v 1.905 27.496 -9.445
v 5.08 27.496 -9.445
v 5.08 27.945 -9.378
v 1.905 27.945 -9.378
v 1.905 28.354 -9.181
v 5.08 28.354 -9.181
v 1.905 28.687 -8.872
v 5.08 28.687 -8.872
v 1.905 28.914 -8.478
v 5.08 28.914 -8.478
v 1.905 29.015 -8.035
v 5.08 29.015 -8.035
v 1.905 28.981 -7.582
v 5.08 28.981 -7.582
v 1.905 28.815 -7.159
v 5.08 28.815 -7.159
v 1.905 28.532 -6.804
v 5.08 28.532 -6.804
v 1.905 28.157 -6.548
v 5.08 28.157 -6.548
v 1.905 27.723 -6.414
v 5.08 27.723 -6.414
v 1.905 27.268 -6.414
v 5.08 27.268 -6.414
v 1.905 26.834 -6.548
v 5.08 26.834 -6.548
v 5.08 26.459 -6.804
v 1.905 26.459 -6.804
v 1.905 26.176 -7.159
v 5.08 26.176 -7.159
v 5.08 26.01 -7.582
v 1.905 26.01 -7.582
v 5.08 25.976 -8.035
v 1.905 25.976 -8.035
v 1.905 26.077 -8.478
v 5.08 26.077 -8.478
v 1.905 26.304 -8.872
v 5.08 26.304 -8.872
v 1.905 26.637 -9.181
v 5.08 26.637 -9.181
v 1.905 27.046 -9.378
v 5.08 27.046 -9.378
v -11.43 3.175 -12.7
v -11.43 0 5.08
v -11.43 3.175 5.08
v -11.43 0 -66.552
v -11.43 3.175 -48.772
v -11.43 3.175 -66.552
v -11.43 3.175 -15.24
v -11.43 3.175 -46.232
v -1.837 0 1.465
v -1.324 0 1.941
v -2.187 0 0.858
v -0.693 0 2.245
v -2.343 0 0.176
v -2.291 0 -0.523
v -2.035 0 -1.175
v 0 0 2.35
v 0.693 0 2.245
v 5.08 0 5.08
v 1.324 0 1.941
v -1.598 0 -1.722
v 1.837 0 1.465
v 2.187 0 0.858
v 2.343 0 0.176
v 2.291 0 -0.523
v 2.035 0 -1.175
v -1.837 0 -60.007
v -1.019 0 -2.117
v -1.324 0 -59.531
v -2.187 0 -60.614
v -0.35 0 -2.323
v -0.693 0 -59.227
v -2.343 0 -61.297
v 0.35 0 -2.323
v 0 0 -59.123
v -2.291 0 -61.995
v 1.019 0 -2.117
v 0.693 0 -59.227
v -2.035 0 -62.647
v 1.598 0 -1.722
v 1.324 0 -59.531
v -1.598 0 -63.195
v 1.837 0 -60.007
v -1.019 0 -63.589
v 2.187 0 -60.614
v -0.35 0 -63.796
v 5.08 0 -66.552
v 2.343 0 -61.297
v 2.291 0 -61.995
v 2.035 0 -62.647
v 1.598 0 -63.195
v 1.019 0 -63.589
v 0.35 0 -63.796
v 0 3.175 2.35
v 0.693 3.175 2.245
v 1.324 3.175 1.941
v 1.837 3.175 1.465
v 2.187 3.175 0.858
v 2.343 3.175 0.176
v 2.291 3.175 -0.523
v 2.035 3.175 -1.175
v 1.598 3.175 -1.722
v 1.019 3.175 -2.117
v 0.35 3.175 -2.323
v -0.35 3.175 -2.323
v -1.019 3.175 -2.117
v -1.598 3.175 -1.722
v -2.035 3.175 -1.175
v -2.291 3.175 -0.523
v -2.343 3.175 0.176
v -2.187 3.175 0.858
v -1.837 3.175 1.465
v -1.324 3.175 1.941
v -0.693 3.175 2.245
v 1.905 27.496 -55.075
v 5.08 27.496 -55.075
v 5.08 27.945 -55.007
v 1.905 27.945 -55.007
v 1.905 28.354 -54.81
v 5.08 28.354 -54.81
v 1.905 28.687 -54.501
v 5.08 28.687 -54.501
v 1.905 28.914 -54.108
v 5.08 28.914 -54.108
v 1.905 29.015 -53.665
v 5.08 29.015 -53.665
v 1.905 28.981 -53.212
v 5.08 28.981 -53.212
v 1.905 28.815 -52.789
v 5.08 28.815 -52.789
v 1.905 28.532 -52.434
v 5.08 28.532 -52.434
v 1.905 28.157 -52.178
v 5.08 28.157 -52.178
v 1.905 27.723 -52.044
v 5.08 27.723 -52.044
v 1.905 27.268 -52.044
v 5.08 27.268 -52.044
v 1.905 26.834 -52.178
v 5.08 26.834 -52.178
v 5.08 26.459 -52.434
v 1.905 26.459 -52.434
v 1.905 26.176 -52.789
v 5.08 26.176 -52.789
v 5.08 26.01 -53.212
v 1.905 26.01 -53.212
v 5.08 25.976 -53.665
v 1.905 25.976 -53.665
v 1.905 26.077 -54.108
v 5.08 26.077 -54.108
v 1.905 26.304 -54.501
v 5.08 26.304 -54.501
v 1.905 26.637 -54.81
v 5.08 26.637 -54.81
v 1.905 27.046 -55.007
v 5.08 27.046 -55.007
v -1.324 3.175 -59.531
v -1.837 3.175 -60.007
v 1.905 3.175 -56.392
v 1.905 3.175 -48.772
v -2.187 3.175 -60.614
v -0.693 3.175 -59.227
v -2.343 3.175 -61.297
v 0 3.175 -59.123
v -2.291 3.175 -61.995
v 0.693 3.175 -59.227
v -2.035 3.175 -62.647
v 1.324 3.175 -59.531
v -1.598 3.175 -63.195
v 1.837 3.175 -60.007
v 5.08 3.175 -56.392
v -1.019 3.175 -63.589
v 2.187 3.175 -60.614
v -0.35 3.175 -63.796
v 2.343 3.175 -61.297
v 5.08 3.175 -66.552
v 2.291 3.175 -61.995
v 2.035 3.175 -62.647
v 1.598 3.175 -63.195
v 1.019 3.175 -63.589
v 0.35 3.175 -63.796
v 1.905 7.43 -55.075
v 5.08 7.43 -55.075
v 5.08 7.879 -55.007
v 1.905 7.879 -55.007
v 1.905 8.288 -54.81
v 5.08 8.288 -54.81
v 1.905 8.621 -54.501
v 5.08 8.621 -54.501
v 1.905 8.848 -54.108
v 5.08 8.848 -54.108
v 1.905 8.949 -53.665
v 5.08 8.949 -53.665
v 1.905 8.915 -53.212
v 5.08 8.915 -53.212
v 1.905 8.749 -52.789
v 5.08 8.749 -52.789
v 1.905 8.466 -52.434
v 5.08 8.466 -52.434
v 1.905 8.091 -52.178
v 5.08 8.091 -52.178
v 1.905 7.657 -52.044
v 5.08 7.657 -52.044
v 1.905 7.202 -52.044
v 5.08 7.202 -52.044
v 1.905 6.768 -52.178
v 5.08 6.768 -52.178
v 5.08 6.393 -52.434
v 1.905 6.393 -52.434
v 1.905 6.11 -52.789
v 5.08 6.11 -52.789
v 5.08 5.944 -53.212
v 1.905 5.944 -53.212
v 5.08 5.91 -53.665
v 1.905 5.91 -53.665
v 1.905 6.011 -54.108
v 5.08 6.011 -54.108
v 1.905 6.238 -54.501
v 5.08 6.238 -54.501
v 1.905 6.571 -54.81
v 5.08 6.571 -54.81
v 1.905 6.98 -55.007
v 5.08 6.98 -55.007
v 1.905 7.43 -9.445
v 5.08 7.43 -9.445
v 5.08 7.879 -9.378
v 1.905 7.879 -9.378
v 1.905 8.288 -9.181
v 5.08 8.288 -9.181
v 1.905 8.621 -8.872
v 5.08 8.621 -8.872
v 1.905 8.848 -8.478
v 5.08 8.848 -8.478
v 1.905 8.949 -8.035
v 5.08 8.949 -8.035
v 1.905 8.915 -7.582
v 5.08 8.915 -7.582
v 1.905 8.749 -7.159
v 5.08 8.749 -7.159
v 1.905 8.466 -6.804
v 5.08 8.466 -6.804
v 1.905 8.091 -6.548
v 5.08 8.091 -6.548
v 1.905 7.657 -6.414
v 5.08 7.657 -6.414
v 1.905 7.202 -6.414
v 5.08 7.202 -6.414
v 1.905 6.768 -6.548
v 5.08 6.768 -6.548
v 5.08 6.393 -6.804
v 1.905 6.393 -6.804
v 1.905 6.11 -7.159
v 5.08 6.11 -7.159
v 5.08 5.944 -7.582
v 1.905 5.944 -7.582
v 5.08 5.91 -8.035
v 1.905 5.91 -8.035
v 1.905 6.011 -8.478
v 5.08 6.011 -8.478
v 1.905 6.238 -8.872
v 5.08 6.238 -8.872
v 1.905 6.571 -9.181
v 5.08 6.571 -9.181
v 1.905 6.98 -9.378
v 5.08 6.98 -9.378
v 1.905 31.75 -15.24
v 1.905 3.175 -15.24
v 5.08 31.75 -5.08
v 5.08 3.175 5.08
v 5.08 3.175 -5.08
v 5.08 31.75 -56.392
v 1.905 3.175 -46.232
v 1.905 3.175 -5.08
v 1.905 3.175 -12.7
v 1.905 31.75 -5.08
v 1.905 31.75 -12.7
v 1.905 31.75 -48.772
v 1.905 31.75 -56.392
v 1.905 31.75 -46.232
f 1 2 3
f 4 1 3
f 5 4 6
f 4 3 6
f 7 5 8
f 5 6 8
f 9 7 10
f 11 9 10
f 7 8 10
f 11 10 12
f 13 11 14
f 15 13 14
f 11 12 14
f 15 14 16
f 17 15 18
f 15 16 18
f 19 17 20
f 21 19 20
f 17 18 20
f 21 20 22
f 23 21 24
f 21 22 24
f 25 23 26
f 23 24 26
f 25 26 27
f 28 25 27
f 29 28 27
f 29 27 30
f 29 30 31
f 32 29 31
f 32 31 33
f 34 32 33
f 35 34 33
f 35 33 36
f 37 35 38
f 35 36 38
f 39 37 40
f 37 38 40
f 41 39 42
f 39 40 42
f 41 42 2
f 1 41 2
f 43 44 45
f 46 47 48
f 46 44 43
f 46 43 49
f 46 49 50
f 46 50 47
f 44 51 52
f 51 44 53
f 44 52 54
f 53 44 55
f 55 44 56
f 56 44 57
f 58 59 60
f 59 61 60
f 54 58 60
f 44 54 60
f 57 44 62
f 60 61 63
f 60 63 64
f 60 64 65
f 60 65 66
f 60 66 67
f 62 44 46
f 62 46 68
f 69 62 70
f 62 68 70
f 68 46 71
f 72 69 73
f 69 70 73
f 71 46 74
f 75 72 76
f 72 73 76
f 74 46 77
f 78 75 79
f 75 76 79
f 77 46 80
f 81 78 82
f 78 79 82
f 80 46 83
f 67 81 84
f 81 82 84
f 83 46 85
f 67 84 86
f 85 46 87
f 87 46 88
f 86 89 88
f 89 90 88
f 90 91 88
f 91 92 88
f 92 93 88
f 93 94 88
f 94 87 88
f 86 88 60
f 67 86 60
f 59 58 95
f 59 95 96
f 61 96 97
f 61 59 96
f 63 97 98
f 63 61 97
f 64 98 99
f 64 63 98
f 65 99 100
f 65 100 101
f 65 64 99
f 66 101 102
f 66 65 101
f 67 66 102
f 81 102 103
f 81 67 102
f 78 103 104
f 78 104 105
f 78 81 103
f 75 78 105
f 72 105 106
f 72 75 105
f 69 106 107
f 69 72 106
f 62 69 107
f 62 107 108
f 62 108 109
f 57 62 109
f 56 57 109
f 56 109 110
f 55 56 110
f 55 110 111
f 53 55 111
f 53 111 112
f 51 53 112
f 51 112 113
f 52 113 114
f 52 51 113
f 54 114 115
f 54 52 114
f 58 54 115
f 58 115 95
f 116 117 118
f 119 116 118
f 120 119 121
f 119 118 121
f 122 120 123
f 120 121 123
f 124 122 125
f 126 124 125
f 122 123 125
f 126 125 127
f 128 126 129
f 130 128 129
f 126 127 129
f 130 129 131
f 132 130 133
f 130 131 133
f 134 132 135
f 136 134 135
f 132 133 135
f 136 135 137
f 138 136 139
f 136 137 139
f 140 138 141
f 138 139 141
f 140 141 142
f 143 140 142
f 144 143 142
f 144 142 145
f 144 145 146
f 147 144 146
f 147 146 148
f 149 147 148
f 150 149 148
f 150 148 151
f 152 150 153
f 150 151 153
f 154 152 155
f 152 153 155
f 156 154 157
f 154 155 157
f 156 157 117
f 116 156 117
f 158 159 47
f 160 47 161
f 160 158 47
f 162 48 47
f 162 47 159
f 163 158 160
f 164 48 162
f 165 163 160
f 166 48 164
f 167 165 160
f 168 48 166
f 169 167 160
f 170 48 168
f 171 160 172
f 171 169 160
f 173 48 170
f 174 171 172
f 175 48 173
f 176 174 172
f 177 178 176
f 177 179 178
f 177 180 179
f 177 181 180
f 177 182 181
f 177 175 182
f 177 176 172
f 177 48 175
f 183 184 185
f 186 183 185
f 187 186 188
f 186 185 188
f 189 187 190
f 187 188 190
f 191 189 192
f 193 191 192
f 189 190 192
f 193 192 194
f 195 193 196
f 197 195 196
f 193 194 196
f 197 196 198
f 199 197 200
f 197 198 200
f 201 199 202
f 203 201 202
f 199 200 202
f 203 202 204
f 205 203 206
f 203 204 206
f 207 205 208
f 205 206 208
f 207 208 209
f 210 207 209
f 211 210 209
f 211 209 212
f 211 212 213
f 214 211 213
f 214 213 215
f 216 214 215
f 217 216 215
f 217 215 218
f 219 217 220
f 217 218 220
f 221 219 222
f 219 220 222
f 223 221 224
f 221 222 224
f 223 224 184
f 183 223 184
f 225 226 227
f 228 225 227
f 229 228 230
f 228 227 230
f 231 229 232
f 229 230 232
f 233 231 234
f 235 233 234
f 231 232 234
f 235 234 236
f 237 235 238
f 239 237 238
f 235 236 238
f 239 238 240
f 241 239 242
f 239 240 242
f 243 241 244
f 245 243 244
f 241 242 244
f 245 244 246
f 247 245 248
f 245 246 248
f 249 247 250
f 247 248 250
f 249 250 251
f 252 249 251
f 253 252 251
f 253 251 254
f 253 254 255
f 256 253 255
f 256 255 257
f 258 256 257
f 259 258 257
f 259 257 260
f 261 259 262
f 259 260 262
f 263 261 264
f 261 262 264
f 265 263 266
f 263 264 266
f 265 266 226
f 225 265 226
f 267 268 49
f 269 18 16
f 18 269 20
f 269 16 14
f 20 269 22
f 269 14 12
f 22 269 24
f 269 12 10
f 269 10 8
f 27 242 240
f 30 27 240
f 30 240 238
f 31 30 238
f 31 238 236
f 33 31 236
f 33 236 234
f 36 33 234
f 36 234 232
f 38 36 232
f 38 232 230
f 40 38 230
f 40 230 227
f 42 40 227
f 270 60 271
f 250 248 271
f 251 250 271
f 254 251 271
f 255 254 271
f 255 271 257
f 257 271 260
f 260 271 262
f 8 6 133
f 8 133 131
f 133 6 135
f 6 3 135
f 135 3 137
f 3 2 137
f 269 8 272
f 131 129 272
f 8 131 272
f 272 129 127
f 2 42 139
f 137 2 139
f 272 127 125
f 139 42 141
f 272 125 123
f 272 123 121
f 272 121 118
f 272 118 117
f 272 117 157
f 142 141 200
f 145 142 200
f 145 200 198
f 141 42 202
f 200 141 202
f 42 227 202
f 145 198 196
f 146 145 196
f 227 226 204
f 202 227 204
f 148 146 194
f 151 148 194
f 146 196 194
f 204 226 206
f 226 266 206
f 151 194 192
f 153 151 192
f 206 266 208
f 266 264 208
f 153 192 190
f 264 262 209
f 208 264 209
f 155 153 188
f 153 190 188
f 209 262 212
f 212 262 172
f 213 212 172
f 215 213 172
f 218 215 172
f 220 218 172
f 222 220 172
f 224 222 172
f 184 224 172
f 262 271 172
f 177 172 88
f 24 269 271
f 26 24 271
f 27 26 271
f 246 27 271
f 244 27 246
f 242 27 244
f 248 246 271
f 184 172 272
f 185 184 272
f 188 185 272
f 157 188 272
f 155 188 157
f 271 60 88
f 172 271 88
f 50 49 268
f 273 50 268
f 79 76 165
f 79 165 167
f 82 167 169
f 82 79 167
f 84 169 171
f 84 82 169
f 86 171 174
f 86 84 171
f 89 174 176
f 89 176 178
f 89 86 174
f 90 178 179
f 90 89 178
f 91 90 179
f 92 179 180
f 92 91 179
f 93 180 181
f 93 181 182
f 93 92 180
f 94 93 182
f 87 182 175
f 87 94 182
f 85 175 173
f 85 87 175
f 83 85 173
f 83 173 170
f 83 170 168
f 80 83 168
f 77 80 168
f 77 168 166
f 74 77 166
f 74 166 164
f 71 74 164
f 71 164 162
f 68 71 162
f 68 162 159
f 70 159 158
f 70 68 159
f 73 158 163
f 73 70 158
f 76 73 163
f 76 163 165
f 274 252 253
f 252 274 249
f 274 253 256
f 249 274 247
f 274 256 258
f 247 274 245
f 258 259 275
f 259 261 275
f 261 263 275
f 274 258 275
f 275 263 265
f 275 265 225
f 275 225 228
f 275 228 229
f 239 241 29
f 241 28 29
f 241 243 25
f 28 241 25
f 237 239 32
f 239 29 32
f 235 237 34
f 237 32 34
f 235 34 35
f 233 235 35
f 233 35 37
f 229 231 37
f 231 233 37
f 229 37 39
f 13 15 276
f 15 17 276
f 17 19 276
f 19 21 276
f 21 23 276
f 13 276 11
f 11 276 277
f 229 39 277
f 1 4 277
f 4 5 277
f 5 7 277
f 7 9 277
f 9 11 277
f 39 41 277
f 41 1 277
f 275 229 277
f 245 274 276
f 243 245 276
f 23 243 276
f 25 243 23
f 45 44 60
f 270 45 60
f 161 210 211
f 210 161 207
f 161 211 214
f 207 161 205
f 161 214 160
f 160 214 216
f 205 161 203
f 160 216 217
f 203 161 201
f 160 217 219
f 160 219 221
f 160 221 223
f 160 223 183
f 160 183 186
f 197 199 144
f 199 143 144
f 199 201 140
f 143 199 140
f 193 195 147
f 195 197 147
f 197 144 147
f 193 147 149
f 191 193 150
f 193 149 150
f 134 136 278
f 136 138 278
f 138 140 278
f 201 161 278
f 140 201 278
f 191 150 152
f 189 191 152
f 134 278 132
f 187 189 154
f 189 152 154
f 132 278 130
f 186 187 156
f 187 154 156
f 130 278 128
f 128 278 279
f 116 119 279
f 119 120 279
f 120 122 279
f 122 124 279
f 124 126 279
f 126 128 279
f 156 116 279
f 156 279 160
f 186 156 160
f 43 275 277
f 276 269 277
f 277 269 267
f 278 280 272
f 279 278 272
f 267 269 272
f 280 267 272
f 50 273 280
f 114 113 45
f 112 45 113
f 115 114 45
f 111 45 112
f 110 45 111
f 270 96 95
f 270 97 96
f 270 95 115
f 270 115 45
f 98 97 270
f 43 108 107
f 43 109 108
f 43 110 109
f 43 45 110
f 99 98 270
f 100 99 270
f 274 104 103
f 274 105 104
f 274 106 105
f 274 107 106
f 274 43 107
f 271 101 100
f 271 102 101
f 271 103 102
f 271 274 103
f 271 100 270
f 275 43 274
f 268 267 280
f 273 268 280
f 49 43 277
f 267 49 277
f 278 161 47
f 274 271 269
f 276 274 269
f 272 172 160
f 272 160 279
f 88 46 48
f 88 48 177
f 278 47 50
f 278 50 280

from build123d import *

# Parameters (mm, degrees)
SKETCH1_W           = 16.51
SKETCH1_H           = 71.632288028
SKETCH1_R           = 2.3495
BOSS_EXTRUDE1_DEPTH = 3.175
SKETCH2_W           = 51.312288028
SKETCH2_H           = 28.575
SKETCH2_R           = 1.524
BOSS_EXTRUDE2_DEPTH = 3.175
BOSS_EXTRUDE3_DEPTH = 2.54


with BuildPart() as part:
    # Sketch1 → Boss-Extrude1 (new body)
    with BuildSketch(Plane(origin=(0, 0, 0), x_dir=(1, 0, 0), z_dir=(0, 1, 0))):
        with Locations((-3.175, 30.736144014)):
            Rectangle(SKETCH1_W, SKETCH1_H)
        with Locations(Location((0, 61.472288028, 0), (0, 0, 270))):
            Circle(SKETCH1_R, mode=Mode.SUBTRACT)
        with Locations(Location((0, 0, 0), (0, 0, 270))):
            Circle(SKETCH1_R, mode=Mode.SUBTRACT)
    extrude(amount=BOSS_EXTRUDE1_DEPTH)

    # Sketch2 → Boss-Extrude2 (add)
    with BuildSketch(Plane(origin=(5.08, 0, 0), x_dir=(0, 0, -1), z_dir=(1, 0, 0))):
        with Locations((30.736144014, 17.4625)):
            Rectangle(SKETCH2_W, SKETCH2_H)
        with Locations((7.921390431, 7.4295)):
            Circle(SKETCH2_R, mode=Mode.SUBTRACT)
        with Locations((53.550897597, 7.4295)):
            Circle(SKETCH2_R, mode=Mode.SUBTRACT)
        with Locations((7.921390431, 27.4955)):
            Circle(SKETCH2_R, mode=Mode.SUBTRACT)
        with Locations((53.550897597, 27.4955)):
            Circle(SKETCH2_R, mode=Mode.SUBTRACT)
    extrude(amount=-BOSS_EXTRUDE2_DEPTH)

    # Sketch3 → Boss-Extrude3 (add)
    with BuildSketch(Plane(origin=(0, 0, -48.772288028), x_dir=(-1, 0, 0), z_dir=(0, 0, -1))):
        Polygon((-1.905, 31.75), (-1.905, 3.175), (11.43, 3.175), align=None)
    boss_extrude3 = extrude(amount=-BOSS_EXTRUDE3_DEPTH)

    # Mirror1: Boss-Extrude3 across plane
    add(boss_extrude3.mirror(Plane.XY.offset(-30.736144014)))


solid = part.part
